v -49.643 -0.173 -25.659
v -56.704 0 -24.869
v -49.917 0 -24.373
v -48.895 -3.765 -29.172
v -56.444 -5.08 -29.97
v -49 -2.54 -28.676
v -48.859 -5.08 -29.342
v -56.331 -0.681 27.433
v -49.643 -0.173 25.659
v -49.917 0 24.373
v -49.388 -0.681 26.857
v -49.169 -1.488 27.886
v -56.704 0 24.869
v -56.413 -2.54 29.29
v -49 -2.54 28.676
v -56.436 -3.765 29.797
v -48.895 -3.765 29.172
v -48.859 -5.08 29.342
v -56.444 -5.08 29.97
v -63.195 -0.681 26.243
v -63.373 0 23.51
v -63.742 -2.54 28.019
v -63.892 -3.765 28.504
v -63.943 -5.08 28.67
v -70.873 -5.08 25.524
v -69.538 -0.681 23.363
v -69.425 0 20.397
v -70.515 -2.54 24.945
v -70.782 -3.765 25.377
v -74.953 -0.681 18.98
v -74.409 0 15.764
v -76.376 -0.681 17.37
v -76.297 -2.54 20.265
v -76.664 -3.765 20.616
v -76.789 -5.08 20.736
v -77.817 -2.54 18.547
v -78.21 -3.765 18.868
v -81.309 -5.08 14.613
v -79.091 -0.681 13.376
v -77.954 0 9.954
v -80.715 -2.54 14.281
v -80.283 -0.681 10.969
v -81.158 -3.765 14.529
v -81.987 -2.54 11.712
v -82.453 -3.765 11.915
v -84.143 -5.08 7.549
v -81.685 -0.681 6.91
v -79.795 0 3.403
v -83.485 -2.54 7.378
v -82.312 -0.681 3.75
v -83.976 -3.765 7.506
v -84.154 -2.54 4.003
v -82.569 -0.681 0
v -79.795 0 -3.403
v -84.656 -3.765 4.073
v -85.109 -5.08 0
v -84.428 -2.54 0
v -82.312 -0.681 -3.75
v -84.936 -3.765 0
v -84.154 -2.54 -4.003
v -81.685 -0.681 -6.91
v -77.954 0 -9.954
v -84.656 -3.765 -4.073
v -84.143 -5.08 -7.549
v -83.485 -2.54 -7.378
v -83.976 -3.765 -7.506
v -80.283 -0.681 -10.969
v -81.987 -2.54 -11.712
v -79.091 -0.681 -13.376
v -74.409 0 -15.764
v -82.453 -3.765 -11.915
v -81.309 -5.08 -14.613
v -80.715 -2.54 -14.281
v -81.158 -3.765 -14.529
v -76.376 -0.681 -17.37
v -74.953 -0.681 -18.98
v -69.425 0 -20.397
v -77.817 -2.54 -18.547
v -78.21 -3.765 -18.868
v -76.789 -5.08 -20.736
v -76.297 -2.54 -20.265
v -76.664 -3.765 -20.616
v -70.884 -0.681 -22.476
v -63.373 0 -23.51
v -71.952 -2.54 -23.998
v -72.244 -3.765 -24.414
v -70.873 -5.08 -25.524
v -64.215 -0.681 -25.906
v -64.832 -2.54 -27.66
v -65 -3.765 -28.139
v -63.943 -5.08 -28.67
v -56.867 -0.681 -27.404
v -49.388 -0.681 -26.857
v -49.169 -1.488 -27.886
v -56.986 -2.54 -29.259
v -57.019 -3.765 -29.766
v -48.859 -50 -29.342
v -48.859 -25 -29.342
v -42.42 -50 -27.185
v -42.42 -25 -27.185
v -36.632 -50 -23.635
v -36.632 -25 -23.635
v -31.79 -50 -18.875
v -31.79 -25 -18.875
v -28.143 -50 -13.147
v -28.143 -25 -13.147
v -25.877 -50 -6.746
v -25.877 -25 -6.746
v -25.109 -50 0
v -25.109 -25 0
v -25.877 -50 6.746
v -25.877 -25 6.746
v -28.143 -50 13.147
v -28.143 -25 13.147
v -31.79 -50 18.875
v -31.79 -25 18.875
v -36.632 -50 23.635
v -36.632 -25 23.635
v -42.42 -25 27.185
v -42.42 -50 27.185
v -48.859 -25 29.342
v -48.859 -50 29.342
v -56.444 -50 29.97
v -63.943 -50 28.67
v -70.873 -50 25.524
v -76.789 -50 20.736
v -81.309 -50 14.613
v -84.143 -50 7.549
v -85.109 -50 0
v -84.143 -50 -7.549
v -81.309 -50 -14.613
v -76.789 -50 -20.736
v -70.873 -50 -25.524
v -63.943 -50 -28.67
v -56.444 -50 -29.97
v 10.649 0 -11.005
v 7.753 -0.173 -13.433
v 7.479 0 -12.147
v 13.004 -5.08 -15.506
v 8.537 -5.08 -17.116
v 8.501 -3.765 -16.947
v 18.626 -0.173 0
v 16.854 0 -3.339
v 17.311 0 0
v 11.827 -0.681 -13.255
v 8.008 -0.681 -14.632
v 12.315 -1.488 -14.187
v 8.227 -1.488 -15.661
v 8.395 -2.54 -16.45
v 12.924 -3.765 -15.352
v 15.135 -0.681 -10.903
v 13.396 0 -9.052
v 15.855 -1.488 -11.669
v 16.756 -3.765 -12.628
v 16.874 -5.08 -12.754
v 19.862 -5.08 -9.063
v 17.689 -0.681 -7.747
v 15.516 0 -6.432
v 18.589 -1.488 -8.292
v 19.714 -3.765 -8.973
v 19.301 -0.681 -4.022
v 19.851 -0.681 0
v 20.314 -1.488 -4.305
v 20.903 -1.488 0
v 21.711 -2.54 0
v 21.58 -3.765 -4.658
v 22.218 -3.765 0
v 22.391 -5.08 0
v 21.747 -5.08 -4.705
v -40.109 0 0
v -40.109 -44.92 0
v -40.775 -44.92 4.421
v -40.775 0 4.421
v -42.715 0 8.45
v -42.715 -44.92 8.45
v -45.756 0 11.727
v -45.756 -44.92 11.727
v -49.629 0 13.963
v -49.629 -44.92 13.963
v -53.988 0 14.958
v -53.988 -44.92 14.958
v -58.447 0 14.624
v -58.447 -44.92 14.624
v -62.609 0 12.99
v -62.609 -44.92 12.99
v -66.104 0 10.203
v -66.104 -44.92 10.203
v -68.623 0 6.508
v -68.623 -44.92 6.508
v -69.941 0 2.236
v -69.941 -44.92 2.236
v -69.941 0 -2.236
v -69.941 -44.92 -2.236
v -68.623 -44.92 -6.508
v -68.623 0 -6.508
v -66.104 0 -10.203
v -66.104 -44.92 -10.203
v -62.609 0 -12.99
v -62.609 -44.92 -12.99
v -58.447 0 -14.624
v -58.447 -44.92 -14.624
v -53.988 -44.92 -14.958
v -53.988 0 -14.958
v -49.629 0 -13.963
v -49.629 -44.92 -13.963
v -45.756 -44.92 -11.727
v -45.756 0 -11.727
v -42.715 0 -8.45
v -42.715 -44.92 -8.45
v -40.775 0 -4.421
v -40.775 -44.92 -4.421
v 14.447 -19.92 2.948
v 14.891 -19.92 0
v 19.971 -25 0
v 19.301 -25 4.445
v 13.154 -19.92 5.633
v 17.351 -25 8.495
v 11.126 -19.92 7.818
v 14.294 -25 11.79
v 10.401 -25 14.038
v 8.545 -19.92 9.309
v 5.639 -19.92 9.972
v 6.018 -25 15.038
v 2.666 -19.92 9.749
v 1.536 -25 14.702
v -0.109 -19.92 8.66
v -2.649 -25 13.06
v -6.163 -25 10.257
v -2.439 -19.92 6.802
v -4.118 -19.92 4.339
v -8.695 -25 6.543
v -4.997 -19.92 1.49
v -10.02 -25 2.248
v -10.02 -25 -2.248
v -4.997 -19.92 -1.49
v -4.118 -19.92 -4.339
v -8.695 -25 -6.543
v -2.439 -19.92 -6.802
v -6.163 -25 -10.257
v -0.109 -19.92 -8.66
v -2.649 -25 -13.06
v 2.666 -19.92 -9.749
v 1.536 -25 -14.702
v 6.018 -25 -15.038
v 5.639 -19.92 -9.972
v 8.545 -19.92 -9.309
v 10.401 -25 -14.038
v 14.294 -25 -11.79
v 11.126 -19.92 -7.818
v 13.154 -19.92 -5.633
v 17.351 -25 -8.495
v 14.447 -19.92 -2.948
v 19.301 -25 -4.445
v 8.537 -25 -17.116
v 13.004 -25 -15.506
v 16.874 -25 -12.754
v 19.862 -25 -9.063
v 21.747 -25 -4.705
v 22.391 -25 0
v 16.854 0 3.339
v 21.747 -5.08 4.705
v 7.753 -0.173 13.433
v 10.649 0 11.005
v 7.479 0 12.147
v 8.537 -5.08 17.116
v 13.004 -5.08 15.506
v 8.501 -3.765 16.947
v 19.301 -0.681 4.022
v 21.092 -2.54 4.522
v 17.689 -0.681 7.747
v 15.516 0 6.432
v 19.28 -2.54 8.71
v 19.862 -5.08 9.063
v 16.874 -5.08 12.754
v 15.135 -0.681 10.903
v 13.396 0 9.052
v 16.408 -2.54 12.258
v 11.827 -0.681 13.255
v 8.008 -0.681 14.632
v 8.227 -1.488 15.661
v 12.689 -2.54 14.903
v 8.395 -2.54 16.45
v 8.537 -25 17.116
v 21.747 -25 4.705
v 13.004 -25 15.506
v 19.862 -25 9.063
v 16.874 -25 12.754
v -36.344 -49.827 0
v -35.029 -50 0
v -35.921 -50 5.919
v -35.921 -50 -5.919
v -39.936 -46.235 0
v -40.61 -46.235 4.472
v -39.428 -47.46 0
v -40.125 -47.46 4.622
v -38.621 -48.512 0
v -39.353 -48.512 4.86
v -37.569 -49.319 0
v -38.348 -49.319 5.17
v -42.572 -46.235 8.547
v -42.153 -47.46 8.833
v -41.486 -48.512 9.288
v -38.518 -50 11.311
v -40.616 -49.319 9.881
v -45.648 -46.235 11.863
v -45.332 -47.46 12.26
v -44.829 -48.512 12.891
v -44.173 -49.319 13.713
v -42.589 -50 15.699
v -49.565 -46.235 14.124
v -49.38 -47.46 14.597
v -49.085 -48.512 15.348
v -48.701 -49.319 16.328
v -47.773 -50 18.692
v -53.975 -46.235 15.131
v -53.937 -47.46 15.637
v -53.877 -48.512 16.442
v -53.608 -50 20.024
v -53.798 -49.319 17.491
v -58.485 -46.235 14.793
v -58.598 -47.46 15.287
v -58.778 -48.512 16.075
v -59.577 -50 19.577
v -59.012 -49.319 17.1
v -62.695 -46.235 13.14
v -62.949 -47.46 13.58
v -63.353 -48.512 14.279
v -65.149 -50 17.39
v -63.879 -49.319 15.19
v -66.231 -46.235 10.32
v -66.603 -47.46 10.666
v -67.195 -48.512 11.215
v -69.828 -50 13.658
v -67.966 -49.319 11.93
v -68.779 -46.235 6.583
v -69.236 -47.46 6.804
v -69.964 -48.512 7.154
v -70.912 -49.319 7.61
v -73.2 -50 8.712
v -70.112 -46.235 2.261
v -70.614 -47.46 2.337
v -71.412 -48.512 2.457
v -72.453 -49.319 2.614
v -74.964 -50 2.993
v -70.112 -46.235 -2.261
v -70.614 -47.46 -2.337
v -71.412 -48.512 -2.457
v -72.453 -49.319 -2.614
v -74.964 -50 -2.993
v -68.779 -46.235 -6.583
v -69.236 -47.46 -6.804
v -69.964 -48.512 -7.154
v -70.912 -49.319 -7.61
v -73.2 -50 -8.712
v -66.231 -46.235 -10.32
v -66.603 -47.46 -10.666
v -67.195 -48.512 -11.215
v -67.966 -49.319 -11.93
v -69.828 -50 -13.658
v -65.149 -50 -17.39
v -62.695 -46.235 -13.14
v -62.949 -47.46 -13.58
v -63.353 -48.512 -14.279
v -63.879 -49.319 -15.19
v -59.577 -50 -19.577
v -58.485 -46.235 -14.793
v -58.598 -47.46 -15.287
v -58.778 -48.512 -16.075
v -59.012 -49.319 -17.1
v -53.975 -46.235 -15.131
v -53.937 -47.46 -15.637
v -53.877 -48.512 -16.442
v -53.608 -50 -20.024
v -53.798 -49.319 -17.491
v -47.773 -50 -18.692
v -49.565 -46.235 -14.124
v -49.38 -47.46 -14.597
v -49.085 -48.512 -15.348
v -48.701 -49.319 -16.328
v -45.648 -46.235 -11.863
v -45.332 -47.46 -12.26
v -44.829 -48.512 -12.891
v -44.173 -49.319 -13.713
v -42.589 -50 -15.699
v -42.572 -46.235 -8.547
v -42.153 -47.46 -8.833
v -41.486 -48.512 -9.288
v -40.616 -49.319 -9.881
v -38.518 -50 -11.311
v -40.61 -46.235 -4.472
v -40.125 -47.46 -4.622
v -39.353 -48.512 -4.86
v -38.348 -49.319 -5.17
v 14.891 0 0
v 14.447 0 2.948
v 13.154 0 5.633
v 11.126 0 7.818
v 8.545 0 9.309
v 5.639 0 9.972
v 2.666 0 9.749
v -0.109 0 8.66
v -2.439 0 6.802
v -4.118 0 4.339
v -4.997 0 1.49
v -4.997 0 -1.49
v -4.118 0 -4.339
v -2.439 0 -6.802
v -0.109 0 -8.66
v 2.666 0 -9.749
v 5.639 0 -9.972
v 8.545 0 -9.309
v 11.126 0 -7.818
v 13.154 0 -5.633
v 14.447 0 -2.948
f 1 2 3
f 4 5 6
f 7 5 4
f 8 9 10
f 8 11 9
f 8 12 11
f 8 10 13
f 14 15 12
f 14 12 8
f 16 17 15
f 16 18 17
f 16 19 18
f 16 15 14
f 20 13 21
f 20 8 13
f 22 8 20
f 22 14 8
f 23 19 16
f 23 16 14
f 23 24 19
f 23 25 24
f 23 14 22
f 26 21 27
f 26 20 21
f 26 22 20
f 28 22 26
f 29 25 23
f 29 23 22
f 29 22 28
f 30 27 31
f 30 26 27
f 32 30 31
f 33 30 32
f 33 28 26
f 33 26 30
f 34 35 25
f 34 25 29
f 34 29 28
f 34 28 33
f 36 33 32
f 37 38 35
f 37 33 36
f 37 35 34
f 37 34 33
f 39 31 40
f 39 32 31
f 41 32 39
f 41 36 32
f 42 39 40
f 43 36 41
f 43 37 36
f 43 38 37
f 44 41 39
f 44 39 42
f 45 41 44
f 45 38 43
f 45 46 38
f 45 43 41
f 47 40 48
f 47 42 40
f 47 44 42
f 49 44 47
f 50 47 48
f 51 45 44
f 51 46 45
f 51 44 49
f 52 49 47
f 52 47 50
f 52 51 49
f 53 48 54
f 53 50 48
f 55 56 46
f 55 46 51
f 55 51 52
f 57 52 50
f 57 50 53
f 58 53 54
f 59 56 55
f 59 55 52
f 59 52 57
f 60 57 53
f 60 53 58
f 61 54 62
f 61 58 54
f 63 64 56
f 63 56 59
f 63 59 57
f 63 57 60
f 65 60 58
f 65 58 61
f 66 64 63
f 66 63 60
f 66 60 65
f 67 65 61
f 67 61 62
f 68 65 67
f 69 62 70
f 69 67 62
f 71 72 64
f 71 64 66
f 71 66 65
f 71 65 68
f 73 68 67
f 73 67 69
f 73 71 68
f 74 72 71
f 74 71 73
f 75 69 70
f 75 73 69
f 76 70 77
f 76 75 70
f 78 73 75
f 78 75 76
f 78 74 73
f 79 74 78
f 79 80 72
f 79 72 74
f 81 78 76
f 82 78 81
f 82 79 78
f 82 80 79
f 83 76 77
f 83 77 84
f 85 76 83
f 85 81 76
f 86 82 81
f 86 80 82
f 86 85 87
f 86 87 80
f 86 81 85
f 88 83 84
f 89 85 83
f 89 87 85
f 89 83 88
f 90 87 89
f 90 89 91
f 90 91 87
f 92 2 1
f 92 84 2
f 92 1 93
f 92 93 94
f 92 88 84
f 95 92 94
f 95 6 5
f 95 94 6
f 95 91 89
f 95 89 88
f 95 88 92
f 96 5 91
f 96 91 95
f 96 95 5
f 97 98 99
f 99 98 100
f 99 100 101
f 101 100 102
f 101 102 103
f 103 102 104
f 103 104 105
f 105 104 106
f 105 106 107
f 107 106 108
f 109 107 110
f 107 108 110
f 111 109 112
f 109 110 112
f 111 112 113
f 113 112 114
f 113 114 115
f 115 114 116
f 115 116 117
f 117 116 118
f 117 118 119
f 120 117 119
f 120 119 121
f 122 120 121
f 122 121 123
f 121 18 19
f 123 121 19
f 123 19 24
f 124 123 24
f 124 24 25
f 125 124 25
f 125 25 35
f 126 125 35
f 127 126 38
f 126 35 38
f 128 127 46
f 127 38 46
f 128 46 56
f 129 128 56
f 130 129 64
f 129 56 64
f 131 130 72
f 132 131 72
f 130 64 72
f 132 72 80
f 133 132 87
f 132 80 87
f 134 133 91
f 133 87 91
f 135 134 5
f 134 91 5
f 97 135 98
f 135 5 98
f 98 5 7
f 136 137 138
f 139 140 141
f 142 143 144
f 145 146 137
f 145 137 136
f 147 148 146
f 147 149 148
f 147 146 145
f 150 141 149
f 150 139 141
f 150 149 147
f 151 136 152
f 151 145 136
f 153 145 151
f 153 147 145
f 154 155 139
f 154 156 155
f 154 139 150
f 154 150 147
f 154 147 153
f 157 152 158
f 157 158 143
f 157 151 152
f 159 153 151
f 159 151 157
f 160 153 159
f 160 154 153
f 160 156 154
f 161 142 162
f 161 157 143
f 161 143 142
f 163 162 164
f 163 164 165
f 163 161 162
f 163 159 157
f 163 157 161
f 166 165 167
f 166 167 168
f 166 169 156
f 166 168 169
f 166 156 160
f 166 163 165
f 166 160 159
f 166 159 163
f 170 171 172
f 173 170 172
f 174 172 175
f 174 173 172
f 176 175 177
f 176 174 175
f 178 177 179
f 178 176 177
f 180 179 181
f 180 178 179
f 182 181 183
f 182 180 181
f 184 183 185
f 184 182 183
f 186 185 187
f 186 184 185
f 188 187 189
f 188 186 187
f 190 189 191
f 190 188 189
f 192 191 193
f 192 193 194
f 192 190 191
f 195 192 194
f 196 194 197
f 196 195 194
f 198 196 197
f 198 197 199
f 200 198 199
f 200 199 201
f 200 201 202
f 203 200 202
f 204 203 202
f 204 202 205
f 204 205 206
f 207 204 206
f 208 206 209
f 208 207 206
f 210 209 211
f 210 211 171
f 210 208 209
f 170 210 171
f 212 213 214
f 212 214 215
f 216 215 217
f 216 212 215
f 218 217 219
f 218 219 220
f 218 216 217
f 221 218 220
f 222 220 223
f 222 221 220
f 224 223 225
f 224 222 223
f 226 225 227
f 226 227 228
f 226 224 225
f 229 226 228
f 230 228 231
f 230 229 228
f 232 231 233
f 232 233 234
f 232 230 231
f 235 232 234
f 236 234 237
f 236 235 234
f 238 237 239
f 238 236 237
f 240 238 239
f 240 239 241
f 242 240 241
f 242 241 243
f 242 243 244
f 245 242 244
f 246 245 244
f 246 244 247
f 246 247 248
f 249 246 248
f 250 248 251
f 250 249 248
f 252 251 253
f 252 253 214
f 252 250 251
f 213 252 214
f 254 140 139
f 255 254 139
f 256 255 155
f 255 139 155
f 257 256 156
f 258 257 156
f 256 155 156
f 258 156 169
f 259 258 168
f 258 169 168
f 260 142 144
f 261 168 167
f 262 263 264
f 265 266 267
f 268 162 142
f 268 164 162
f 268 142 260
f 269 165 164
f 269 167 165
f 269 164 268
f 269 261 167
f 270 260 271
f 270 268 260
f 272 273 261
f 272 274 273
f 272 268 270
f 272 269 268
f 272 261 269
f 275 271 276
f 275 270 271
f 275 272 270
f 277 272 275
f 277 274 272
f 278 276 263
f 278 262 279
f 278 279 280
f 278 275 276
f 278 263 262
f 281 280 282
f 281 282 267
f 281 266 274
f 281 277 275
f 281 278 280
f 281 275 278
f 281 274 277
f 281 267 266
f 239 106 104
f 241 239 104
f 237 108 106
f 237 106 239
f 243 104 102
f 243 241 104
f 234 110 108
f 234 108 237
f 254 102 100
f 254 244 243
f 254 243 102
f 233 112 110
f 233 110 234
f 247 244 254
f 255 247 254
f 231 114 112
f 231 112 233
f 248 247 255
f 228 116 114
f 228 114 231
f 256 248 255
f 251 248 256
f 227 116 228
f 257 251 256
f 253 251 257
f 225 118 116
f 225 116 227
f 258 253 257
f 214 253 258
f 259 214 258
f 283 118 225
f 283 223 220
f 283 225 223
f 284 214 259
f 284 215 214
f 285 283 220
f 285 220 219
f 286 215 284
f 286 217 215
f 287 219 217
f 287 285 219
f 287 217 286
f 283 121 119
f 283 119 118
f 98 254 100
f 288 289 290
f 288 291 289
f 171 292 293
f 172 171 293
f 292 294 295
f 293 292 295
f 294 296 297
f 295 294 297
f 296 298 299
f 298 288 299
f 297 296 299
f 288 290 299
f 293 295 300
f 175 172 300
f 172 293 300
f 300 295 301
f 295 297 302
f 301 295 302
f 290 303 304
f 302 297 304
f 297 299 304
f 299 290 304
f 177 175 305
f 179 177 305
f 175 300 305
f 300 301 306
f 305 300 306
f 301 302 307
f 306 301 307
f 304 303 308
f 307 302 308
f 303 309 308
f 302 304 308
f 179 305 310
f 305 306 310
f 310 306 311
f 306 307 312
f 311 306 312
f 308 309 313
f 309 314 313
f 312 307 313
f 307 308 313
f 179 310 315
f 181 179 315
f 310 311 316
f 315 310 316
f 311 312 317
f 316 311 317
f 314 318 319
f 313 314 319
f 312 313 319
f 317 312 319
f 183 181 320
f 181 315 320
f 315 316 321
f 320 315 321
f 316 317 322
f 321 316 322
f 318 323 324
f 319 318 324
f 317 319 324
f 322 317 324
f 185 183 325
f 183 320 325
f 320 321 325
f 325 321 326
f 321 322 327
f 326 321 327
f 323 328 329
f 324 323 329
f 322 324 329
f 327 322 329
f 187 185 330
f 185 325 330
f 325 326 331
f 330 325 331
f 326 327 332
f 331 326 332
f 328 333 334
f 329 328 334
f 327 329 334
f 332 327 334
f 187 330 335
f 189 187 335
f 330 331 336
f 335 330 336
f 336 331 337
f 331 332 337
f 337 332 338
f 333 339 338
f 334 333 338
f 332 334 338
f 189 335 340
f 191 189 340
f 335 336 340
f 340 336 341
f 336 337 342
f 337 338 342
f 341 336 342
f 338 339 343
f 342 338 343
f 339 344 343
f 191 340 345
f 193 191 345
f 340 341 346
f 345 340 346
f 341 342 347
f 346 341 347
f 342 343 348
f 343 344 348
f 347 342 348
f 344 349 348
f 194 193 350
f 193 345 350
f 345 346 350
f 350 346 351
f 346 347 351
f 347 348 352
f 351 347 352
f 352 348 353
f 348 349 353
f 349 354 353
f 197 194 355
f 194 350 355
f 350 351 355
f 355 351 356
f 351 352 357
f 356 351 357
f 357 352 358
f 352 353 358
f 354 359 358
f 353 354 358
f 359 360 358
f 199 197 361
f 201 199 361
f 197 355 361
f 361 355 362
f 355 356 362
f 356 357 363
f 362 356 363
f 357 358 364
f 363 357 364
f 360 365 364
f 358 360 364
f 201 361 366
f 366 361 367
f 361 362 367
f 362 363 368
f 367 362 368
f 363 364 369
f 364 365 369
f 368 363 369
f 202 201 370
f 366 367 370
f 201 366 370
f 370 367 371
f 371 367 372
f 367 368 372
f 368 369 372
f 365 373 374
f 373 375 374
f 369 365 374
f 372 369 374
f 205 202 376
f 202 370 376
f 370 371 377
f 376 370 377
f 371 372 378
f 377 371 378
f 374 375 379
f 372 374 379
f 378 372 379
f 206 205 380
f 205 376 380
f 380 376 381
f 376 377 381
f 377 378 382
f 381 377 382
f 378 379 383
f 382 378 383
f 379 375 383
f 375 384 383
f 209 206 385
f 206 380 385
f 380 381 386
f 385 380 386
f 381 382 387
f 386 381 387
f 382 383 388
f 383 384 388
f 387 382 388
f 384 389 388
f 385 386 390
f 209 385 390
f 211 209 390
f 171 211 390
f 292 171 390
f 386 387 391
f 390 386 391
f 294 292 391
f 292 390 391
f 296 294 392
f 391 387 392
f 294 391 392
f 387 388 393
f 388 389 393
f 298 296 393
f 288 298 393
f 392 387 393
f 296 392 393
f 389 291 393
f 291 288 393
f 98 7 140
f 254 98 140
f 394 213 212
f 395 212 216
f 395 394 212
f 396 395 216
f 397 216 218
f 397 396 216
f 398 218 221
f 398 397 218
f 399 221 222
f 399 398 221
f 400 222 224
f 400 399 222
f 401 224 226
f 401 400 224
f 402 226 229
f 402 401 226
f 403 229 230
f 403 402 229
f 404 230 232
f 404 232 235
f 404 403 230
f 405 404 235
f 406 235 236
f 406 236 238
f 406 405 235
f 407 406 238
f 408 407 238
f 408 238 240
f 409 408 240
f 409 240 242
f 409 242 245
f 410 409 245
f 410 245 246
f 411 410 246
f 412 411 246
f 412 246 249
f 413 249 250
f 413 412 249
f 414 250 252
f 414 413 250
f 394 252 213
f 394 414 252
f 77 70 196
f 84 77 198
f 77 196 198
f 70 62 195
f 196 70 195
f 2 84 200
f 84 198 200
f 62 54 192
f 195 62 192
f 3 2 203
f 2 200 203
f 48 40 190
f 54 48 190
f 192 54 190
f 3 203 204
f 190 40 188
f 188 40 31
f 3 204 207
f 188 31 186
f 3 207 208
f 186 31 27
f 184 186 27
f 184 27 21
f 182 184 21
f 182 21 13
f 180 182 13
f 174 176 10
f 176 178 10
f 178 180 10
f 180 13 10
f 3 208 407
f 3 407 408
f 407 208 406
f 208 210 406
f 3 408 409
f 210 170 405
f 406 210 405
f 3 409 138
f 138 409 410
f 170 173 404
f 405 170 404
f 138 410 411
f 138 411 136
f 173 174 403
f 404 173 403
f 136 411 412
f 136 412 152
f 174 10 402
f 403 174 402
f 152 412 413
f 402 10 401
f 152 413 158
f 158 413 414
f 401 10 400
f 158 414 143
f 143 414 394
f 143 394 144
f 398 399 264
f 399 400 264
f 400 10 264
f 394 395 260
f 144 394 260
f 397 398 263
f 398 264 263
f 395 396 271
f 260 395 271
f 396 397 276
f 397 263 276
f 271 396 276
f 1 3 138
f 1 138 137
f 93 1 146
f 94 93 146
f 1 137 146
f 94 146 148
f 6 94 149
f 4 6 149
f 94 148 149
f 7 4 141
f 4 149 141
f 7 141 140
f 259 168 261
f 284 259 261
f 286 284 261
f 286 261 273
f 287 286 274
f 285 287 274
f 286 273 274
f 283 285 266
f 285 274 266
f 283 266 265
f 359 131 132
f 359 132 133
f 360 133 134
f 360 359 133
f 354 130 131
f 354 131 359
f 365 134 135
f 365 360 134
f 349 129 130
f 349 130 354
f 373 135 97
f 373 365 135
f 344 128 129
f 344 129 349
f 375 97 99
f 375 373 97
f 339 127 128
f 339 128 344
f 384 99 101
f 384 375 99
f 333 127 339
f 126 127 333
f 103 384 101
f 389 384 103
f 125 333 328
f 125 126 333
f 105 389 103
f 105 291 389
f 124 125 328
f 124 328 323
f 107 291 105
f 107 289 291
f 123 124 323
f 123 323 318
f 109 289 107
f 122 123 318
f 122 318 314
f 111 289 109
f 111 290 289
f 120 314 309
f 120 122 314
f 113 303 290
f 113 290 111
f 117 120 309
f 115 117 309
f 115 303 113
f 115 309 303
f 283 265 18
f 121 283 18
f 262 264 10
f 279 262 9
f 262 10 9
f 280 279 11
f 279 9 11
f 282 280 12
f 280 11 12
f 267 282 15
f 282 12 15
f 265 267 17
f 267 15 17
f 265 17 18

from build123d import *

# Parameters (mm, degrees)
F0_R     = 15
F0_R_2   = 10
F1_DEPTH = 25
F2_DEPTH = 50
F3_R     = 5.08
F4_SIZE  = 5.08


with BuildPart() as f1:
    # F0 (on Front) → F1 (new body)
    with BuildSketch(Plane.XZ):
        with BuildLine():
            ThreePointArc((-48.8587082131, -29.3417364858), (-31.7902605804, -18.8745860882), (-25.1087082131, 0))
            ThreePointArc((-25.1087082131, 0), (-31.7902605804, 18.8745860882), (-48.8587082131, 29.3417364858))
            ThreePointArc((-48.8587082131, 29.3417364858), (-85.1087082131, 0), (-48.8587082131, -29.3417364858))
        make_face()
        with Locations((-55.1087082131, 0)):
            Circle(F0_R, mode=Mode.SUBTRACT)
        with BuildLine():
            ThreePointArc((-48.8587082131, 29.3417364858), (-31.7902605804, 18.8745860882), (-25.1087082131, 0))
            ThreePointArc((-25.1087082131, 0), (-31.7902605804, -18.8745860882), (-48.8587082131, -29.3417364858))
            Line((-48.8587082131, -29.3417364858), (8.5371251202, -17.11601295))
            ThreePointArc((8.5371251202, -17.11601295), (-12.6087082131, 0), (8.5371251202, 17.11601295))
            Line((8.5371251202, 17.11601295), (-48.8587082131, 29.3417364858))
        make_face()
        with BuildLine():
            ThreePointArc((22.3912917869, 0), (18.4937195726, 11.0101752181), (8.5371251202, 17.11601295))
            ThreePointArc((8.5371251202, 17.11601295), (-12.6087082131, 0), (8.5371251202, -17.11601295))
            ThreePointArc((8.5371251202, -17.11601295), (18.4937195726, -11.0101752181), (22.3912917869, 0))
        make_face()
        with Locations((4.8912917869, 0)):
            Circle(F0_R_2, mode=Mode.SUBTRACT)
    extrude(amount=F1_DEPTH)

    # F0 (on Front) → F2 (join)
    with BuildSketch(Plane.XZ):
        with BuildLine():
            ThreePointArc((-48.8587082131, -29.3417364858), (-31.7902605804, -18.8745860882), (-25.1087082131, 0))
            ThreePointArc((-25.1087082131, 0), (-31.7902605804, 18.8745860882), (-48.8587082131, 29.3417364858))
            ThreePointArc((-48.8587082131, 29.3417364858), (-85.1087082131, 0), (-48.8587082131, -29.3417364858))
        make_face()
        with Locations((-55.1087082131, 0)):
            Circle(F0_R, mode=Mode.SUBTRACT)
    extrude(amount=F2_DEPTH)

    # F3
    f3_edges = [f1.edges().sort_by_distance(p)[0] for p in [
        (-70.108708, -50, 0),
        (-20.160792, 0, -23.228875),
    ]]
    fillet(f3_edges, radius=F3_R)

    # F4
    f4_edges = [f1.edges().sort_by_distance(p)[0] for p in [
        (-38.620811, -48.512102, 0),
        (-70.108708, -44.92, 0),
        (-75.188708, -50, 0),
        (-5.108708, -25, 0),
    ]]
    chamfer(f4_edges, length=F4_SIZE)


solid = f1.part
